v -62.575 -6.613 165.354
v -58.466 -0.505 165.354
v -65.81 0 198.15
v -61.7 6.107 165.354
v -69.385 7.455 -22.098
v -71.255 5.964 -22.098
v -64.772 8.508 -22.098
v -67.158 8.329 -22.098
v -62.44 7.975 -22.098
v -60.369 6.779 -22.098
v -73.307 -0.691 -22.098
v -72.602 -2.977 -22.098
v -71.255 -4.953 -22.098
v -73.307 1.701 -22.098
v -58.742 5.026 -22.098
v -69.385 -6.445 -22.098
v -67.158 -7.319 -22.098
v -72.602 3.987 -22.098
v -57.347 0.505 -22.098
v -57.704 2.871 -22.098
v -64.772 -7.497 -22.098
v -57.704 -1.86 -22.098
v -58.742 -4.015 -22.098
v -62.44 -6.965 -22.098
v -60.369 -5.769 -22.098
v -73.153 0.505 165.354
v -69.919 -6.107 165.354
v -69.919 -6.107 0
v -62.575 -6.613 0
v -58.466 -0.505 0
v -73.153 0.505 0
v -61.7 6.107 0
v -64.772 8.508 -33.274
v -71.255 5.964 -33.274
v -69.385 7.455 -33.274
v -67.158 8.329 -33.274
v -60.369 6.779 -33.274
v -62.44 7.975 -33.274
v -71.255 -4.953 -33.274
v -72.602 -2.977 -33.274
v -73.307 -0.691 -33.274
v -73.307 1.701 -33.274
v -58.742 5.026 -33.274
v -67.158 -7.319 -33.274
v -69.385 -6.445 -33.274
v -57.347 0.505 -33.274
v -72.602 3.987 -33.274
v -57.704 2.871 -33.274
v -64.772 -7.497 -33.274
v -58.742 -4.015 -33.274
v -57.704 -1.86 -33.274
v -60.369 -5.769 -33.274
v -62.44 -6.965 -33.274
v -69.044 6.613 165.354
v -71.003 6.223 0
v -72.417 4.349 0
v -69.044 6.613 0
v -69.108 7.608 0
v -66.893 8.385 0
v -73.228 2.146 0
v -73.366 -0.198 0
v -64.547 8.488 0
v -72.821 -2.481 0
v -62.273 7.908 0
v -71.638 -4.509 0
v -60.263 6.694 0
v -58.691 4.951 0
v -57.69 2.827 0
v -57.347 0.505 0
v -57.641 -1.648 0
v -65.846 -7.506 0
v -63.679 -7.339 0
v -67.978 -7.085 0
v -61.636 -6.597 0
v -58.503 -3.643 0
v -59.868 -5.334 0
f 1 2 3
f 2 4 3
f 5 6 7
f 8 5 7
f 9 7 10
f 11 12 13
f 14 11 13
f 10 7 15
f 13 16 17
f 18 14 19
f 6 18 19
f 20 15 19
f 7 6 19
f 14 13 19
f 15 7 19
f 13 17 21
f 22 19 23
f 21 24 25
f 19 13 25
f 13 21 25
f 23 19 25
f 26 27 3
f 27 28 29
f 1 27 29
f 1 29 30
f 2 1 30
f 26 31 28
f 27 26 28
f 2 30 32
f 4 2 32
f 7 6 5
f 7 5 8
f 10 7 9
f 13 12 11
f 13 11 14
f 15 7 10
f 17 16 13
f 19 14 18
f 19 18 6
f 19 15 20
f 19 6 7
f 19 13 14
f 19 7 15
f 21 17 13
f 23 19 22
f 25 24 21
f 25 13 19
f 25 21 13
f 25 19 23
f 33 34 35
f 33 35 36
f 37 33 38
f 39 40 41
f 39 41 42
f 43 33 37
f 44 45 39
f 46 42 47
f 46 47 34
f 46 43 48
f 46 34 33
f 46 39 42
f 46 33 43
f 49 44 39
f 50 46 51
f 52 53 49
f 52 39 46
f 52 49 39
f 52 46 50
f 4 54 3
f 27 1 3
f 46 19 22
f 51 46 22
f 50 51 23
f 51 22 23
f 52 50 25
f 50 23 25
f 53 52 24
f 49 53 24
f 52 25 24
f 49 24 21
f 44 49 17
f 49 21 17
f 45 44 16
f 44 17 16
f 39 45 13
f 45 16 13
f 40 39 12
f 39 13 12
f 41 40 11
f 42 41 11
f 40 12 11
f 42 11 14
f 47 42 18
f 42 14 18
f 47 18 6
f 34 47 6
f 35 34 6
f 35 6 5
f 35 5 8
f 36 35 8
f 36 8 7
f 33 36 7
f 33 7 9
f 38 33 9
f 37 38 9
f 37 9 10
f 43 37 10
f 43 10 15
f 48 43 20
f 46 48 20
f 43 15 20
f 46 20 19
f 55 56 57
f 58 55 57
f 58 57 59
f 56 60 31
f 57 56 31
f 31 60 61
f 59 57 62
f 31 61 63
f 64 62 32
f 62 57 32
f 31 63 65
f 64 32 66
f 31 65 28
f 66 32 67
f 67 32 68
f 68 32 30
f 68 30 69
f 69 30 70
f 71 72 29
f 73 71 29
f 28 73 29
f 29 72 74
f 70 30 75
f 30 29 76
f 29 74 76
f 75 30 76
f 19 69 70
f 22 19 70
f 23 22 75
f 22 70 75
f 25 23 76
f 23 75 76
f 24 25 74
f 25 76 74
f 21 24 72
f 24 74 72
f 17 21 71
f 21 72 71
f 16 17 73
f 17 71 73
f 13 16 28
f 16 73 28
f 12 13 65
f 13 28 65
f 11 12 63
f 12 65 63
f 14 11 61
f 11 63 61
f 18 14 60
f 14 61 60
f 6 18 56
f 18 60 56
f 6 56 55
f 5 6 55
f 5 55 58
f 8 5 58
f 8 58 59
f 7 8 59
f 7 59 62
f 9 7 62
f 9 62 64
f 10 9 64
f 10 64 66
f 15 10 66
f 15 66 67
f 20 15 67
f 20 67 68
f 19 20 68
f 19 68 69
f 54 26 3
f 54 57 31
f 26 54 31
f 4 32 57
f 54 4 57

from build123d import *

# Parameters (mm, degrees)
F1_DEPTH = 165.354
F2_R     = 8.0249710932
F3_DEPTH = 22.098
F4_DEPTH = 34.544
F4_TAPER = 11
F5_R     = 8.0249710932
F6_DEPTH = 11.176


with BuildPart() as f1:
    # F0 (on Top) → F1 (new body)
    with BuildSketch(Plane.XY):
        Polygon((-62.5752878926, -6.6125056397), (-58.4658610084, -0.5052305136), (-61.7002029734, 6.107275126), (-69.0439718225, 6.6125056397), (-73.1533987067, 0.5052305136), (-69.9190567417, -6.107275126), align=None)
    extrude(amount=F1_DEPTH)

    # F2 (on face) → F3 (join)
    with BuildSketch(Plane(origin=(0, 0, 0), x_dir=(1, 0, 0), z_dir=(0, 0, -1))):
        with Locations((-65.372087398, -0.5052305136)):
            Circle(F2_R)
    extrude(amount=F3_DEPTH)

    # F1_face1 (on face) → F4 (join)
    with BuildSketch(Plane(origin=(-65.8096298575, 0, 165.354), x_dir=(1, 0, 0), z_dir=(0, 0, 1))):
        Polygon((-7.3437688491, 0.5052305136), (-4.1094268841, -6.107275126), (3.234341965, -6.6125056397), (7.3437688491, -0.5052305136), (4.1094268841, 6.107275126), (-3.234341965, 6.6125056397), align=None)
    extrude(amount=F4_DEPTH, taper=F4_TAPER)


with BuildPart() as f6:
    # F5 (on face) → F6 (new body)
    with BuildSketch(Plane(origin=(0, 0, -22.098), x_dir=(1, 0, 0), z_dir=(0, 0, -1))):
        with Locations((-65.372087398, -0.5052305136)):
            Circle(F5_R)
    extrude(amount=F6_DEPTH)


solid = Compound([f1.part, f6.part])
